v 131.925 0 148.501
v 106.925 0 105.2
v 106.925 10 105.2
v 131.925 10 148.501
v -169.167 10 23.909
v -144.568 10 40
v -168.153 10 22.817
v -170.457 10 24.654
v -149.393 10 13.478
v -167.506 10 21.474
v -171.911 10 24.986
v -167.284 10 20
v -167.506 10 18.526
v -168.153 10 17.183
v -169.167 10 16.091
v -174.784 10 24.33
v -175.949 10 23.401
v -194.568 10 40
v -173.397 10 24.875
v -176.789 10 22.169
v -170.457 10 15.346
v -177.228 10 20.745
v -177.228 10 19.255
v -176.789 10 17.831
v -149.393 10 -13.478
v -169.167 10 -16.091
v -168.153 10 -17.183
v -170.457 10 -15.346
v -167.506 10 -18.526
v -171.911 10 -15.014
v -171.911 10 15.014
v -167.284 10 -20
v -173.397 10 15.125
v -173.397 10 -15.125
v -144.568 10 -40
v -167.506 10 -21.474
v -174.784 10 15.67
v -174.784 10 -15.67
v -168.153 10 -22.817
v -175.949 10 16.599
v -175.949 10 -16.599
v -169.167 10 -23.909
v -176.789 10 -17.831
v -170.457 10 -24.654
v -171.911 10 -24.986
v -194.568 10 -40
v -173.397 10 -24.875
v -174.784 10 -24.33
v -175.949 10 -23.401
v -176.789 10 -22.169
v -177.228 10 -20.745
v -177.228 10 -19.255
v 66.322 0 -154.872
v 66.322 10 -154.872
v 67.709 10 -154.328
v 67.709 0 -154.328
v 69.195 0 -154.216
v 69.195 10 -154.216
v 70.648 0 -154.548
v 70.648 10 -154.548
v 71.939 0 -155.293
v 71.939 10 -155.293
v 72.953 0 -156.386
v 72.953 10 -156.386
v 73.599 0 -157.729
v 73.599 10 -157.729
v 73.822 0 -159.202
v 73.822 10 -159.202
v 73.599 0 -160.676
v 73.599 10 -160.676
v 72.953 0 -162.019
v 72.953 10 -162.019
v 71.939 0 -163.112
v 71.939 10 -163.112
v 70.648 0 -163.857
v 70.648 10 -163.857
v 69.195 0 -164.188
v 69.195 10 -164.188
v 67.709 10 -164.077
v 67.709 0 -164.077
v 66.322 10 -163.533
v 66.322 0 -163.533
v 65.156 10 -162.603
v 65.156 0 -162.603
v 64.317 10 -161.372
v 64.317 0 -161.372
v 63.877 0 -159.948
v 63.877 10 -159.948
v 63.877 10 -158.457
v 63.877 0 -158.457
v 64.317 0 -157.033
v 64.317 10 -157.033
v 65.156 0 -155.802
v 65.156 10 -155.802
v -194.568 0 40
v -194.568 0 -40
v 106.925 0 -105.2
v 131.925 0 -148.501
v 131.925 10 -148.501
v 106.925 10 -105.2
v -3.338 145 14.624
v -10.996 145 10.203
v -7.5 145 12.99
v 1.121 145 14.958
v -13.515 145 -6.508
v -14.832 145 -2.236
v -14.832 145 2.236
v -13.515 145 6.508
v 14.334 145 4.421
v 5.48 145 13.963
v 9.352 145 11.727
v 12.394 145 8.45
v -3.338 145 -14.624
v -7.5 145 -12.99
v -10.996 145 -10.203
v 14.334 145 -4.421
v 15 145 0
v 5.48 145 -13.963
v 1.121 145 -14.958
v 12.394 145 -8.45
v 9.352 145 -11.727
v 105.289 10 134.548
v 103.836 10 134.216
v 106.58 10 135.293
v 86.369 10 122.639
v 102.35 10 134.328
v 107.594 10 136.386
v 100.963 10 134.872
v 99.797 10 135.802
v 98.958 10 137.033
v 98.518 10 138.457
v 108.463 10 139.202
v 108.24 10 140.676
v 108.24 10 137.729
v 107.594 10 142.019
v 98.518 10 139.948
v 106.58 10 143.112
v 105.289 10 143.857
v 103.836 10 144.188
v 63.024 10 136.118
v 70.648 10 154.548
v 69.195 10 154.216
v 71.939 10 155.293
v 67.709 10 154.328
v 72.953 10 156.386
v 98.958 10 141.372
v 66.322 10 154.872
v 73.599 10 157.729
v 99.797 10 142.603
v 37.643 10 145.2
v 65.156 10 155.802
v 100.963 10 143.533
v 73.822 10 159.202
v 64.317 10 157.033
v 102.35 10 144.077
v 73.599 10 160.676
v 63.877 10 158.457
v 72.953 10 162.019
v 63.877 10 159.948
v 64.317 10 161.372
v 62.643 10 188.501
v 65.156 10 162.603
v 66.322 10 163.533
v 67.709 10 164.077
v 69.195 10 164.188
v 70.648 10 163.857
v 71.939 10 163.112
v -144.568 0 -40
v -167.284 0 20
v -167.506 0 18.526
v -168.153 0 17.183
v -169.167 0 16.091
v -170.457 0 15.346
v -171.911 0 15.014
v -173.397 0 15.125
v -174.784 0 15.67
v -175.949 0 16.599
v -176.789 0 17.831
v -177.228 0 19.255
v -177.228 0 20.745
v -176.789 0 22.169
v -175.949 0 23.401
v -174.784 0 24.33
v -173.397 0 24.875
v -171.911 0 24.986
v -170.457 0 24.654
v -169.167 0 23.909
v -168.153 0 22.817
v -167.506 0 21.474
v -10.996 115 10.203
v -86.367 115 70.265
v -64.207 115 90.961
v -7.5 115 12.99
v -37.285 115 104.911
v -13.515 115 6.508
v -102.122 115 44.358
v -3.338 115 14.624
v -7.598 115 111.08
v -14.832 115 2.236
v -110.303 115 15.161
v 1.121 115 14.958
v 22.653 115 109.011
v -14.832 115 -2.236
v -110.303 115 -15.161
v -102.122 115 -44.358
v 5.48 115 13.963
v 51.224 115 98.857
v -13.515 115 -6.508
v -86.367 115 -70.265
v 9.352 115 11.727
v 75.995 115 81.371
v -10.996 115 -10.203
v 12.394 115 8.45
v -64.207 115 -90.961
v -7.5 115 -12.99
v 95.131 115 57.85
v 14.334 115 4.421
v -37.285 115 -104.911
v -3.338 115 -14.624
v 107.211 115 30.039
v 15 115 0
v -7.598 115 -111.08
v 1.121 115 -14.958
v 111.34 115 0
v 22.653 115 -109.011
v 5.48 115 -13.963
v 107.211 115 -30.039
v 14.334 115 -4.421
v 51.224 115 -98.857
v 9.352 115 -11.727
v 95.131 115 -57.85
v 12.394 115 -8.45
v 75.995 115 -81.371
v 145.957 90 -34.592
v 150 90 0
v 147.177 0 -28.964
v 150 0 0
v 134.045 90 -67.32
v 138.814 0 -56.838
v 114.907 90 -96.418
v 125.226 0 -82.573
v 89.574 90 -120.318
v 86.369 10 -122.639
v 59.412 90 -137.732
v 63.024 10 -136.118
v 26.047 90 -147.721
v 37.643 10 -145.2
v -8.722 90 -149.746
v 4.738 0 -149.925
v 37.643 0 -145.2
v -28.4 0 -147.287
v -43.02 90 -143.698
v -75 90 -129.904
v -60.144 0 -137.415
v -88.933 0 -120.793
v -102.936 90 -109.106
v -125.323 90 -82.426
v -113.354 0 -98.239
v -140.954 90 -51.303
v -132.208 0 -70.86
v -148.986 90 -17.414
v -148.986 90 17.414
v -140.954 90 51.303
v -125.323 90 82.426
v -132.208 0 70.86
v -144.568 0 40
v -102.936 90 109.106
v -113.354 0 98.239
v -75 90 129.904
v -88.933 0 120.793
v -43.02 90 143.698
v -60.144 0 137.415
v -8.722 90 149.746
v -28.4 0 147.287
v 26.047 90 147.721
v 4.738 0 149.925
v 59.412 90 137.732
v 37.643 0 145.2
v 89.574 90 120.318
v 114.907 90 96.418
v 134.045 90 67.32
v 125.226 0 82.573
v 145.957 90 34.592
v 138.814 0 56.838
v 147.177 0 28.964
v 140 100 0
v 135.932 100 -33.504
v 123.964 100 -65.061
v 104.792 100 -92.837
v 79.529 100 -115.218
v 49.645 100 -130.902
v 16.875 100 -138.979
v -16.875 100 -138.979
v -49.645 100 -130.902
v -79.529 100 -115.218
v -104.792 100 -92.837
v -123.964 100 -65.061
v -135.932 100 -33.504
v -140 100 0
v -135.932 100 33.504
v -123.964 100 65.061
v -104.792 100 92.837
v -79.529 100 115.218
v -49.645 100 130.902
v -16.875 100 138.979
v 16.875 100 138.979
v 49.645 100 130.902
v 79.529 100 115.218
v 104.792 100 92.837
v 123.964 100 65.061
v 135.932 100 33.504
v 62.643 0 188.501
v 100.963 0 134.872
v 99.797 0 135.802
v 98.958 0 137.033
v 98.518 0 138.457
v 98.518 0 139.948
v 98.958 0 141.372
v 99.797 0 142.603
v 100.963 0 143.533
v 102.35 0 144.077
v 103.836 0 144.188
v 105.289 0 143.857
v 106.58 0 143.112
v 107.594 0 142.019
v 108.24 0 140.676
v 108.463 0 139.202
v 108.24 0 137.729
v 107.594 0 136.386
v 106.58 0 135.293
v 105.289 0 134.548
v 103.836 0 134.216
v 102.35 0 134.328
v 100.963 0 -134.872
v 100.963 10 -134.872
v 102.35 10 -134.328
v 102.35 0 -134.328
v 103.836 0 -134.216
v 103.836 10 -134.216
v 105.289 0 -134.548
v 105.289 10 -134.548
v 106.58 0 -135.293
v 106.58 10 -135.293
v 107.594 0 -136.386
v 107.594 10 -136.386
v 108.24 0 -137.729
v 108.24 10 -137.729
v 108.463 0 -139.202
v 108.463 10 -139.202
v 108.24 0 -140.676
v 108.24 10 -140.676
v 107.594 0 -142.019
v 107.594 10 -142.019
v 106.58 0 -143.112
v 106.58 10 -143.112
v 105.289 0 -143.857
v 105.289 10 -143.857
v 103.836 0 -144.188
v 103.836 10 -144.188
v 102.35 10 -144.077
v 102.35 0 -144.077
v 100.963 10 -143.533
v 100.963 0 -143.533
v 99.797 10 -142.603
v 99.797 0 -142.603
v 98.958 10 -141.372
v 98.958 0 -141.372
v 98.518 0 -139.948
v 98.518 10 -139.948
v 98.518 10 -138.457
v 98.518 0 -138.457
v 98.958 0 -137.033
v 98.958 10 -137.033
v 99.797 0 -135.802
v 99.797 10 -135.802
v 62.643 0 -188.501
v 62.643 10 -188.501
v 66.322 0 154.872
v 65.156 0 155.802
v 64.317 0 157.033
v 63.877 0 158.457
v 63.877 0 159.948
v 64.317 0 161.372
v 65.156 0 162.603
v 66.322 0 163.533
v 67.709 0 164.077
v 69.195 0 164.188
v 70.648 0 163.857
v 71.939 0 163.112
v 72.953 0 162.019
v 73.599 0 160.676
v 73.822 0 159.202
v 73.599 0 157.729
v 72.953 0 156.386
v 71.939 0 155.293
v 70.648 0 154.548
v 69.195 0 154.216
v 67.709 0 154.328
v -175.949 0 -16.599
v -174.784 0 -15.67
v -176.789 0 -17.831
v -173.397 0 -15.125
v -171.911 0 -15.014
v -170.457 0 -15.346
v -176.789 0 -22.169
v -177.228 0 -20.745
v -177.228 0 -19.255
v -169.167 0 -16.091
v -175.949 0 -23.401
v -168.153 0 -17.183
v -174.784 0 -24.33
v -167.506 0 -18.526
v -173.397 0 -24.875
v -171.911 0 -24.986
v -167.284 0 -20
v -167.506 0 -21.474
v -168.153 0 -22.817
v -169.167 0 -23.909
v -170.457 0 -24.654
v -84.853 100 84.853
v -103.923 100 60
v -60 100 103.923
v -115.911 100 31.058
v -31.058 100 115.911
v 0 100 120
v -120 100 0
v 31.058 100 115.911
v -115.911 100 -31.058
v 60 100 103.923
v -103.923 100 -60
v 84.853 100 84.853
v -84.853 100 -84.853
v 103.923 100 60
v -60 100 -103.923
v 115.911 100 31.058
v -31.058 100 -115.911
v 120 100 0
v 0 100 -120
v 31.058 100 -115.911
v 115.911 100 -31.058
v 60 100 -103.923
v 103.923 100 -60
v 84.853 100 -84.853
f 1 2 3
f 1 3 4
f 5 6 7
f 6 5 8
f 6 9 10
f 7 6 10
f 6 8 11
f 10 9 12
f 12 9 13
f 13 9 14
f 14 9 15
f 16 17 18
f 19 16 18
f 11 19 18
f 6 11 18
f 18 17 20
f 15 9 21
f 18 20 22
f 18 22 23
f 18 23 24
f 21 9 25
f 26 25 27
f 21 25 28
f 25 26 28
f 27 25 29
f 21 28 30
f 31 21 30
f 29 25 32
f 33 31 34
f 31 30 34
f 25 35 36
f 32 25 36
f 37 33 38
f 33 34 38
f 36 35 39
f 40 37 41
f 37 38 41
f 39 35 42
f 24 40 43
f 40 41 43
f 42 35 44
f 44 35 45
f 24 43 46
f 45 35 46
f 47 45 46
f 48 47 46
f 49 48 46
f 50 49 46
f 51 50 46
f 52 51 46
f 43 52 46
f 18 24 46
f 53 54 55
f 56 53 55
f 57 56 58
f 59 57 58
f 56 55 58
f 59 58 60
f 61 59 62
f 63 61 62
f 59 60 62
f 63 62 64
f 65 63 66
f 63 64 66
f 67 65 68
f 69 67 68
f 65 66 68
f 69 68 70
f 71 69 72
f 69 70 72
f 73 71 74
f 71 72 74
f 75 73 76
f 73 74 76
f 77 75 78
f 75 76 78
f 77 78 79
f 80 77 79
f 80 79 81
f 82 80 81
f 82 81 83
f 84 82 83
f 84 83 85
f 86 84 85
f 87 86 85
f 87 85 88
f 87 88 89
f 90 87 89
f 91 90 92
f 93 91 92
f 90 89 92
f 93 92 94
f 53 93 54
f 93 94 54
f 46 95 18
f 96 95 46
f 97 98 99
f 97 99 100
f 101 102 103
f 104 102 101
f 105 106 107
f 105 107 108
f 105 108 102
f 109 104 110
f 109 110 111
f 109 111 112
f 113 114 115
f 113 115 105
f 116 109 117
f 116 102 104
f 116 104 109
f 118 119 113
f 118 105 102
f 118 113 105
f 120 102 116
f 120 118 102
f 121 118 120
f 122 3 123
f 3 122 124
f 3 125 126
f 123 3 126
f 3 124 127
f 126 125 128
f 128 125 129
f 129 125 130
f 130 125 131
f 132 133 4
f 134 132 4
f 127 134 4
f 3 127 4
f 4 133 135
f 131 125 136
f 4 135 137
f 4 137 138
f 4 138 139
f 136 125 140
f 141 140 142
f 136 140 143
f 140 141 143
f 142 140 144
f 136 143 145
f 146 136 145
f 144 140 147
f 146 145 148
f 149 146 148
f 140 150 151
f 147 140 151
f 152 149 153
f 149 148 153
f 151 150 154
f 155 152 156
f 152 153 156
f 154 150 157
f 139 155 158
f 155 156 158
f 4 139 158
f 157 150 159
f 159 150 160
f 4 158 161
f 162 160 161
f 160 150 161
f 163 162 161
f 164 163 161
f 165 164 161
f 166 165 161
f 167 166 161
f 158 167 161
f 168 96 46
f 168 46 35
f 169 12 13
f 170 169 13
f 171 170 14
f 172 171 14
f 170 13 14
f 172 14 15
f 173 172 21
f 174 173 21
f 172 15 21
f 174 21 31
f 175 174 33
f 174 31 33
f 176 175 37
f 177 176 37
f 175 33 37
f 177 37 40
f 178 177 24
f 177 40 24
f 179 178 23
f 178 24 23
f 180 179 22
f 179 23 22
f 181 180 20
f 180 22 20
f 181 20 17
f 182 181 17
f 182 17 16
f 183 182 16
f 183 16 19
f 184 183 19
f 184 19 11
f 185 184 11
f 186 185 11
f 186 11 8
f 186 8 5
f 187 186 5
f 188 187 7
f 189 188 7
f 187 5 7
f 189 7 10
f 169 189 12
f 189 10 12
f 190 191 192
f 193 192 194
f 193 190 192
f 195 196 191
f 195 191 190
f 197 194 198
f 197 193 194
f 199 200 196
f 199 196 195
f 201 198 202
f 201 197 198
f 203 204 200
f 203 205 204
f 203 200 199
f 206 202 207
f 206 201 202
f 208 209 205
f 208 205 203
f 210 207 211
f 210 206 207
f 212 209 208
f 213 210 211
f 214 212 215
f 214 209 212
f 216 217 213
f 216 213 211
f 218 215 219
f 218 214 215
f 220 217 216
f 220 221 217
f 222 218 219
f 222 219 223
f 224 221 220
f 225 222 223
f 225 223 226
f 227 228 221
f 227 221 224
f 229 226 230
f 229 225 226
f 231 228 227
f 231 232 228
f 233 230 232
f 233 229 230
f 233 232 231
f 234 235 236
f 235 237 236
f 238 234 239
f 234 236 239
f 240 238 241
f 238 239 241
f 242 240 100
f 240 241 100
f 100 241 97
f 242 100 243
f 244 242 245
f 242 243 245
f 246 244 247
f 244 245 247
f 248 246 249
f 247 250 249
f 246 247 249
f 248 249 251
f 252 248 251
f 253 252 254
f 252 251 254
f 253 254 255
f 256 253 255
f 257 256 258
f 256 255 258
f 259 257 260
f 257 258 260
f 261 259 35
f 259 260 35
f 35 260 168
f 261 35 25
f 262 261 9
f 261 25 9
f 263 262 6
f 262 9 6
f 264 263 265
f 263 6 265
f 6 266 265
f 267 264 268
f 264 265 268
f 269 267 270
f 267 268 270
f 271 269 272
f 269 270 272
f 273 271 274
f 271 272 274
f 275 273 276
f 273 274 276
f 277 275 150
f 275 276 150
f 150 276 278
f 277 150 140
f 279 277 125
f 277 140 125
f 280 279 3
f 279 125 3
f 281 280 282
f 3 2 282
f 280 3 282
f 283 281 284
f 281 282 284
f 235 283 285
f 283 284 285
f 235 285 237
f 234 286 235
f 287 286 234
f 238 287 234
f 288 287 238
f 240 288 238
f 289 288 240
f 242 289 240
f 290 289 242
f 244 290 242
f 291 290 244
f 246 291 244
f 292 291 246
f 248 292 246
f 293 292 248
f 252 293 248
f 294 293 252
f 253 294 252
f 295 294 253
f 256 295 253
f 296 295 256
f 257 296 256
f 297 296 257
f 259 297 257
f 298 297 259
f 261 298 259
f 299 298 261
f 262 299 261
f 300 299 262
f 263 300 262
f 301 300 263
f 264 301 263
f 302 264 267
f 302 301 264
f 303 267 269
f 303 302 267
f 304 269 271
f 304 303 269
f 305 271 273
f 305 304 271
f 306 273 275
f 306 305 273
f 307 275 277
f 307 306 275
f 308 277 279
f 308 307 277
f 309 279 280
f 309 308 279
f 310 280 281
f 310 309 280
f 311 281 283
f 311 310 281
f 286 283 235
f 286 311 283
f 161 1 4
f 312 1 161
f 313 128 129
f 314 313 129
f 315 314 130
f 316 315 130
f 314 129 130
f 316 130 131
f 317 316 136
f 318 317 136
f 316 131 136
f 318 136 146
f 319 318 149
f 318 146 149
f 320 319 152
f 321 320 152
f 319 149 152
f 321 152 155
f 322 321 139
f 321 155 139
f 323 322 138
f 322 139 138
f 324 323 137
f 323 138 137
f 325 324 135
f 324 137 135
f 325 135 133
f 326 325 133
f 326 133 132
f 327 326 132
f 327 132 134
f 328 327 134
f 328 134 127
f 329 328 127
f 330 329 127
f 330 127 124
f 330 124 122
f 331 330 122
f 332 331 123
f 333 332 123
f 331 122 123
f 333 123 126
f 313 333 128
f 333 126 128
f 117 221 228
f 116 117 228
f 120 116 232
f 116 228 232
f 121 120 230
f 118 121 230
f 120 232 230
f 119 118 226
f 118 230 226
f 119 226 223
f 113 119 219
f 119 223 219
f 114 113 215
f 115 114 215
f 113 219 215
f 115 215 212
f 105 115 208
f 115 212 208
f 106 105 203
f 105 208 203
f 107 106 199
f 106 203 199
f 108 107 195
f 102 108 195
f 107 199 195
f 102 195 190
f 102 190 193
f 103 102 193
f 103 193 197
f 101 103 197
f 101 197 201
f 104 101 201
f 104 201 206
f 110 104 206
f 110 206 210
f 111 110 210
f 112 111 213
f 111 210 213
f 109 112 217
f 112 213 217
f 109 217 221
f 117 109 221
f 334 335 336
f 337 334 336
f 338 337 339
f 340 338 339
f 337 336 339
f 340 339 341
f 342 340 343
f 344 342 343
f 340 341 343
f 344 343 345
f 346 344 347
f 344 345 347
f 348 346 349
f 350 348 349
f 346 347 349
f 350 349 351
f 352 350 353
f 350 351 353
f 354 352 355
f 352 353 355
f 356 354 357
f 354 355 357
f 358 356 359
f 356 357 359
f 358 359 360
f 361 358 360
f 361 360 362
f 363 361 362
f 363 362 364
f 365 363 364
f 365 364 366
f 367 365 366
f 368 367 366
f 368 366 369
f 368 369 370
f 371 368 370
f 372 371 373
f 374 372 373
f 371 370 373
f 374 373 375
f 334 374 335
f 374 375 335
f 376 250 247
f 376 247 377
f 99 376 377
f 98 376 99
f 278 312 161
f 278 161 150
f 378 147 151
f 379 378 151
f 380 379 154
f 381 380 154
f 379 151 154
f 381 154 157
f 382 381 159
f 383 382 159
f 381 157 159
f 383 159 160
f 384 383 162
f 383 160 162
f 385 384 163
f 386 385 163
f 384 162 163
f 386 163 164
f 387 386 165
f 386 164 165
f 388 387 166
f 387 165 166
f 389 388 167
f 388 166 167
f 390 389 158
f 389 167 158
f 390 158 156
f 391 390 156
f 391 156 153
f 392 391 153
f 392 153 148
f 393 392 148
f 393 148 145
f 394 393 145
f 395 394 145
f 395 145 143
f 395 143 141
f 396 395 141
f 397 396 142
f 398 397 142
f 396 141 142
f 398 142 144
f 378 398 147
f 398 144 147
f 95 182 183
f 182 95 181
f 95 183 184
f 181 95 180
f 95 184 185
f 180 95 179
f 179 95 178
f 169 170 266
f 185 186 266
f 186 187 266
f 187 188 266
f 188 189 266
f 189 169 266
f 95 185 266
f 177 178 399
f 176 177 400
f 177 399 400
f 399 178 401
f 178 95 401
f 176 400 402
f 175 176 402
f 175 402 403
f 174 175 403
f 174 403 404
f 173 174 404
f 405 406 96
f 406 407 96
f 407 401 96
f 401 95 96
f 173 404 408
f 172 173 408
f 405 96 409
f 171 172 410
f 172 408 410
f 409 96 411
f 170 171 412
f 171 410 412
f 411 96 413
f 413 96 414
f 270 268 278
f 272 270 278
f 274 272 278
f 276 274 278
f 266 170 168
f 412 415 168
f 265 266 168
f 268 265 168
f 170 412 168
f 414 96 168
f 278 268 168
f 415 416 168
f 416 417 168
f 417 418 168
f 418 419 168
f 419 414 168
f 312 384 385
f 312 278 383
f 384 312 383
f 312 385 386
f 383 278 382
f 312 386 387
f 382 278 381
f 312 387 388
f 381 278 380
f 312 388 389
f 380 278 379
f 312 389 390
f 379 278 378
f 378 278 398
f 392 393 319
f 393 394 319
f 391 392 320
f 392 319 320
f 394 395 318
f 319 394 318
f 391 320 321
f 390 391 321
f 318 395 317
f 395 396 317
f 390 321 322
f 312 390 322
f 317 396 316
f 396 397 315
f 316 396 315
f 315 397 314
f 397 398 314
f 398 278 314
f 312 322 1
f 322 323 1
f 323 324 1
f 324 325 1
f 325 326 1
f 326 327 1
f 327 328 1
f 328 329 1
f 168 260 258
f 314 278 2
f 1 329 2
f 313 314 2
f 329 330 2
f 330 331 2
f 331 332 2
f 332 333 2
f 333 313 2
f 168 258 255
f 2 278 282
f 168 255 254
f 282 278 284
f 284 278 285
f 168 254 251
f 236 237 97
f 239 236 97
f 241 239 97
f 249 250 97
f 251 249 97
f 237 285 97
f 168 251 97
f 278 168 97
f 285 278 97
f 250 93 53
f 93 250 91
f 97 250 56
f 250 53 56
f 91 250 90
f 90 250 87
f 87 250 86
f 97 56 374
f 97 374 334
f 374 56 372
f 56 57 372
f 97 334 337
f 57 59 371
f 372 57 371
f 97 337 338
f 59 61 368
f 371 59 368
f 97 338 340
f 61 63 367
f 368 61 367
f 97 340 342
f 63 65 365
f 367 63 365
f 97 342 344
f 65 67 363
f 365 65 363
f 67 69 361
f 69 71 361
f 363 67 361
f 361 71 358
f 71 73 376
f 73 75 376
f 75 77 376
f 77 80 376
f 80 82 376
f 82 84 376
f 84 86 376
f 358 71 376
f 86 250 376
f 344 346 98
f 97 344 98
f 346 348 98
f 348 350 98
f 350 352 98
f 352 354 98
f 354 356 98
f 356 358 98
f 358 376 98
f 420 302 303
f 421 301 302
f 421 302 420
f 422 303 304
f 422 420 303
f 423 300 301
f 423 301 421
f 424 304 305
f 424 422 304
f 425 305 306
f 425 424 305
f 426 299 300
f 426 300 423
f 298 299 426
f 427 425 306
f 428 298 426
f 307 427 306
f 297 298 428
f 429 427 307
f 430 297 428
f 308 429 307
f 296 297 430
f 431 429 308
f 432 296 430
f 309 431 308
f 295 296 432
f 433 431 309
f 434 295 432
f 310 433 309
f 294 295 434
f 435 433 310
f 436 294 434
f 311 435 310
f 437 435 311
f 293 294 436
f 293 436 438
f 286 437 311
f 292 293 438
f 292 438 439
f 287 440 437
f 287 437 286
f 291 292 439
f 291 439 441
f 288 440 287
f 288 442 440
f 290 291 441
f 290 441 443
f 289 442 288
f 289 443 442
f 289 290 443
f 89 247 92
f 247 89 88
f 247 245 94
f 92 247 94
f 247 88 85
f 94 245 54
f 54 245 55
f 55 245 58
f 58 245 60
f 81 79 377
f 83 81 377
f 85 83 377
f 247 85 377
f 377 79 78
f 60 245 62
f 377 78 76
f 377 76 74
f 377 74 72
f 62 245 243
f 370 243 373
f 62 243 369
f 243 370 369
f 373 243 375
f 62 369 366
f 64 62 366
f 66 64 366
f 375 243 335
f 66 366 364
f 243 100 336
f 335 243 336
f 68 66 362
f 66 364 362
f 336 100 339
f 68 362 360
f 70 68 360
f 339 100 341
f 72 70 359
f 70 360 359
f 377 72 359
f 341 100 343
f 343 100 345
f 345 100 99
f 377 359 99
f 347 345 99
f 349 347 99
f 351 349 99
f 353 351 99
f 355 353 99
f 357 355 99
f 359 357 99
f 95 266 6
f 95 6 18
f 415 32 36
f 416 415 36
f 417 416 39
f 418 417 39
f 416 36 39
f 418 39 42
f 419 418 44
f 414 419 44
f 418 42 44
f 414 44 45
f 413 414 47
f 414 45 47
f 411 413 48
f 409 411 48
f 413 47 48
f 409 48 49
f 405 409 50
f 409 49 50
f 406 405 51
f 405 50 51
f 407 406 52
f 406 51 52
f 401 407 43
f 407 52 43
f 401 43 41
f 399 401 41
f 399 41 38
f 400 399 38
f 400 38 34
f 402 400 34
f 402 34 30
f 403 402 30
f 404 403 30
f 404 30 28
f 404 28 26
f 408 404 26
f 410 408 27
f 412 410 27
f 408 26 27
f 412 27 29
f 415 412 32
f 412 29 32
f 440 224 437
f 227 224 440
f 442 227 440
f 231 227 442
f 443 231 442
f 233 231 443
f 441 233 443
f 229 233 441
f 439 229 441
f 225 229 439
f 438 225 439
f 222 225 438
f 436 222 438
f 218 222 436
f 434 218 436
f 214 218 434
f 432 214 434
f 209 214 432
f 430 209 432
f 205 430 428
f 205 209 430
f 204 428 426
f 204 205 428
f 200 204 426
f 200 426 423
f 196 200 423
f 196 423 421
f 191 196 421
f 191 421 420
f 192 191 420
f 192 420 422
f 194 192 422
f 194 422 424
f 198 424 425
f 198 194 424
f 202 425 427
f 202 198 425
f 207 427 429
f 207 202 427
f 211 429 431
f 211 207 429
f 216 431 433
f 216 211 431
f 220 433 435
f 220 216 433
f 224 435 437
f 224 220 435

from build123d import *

# Parameters (mm, degrees)
SKETCH1_R           = 150
BOSS_EXTRUDE1_DEPTH = 100
CHAMFER1_SIZE       = 10
BOSS_EXTRUDE2_START = -100
BOSS_EXTRUDE2_DEPTH = 10
SKETCH3_R           = 5
CUT_EXTRUDE1_DEPTH  = 10
CIRPATTERN2_COUNT   = 3
SKETCH4_R           = 120
BOSS_EXTRUDE4_DEPTH = 15
BOSS_EXTRUDE4_TAPER = 30
SKETCH5_R           = 15
BOSS_EXTRUDE5_DEPTH = 30


with BuildPart() as part:
    # Sketch1 → Boss-Extrude1 (new body)
    with BuildSketch(Plane(origin=(0, 0, 0), x_dir=(1, 0, 0), z_dir=(0, 1, 0))):
        Circle(SKETCH1_R)
    extrude(amount=BOSS_EXTRUDE1_DEPTH)

    # Chamfer1
    chamfer1_edges = [part.edges().sort_by_distance(p)[0] for p in [
        (-150, 100, 0),
    ]]
    chamfer(chamfer1_edges, length=CHAMFER1_SIZE)

    # Sketch2 → Boss-Extrude2 (add)
    with BuildSketch(Plane(origin=(0, 100, 0), x_dir=(1, 0, 0), z_dir=(0, 1, 0)).offset(BOSS_EXTRUDE2_START)):
        with BuildLine():
            Line((-194.568322948, -40), (-194.568322948, 40))
            Line((-194.568322948, 40), (-144.568322948, 40))
            ThreePointArc((-144.568322948, 40), (-150, 0), (-144.568322948, -40))
            Line((-144.568322948, -40), (-194.568322948, -40))
        make_face()
    boss_extrude2 = extrude(amount=BOSS_EXTRUDE2_DEPTH)

    # Sketch3 → Cut-Extrude1 (cut)
    with BuildSketch(Plane(origin=(0, 10, 0), x_dir=(1, 0, 0), z_dir=(0, 1, 0))):
        with Locations((-172.284161474, -20)):
            Circle(SKETCH3_R)
        with Locations((-172.284161474, 20)):
            Circle(SKETCH3_R)
    cut_extrude1 = extrude(amount=-CUT_EXTRUDE1_DEPTH, mode=Mode.SUBTRACT)

    # CirPattern2: Boss-Extrude2, Cut-Extrude1 ×3 about axis
    cirpattern2_axis = Axis((0, 0, 0), (0, 1, 0))
    for i in range(1, CIRPATTERN2_COUNT):
        add(boss_extrude2.rotate(cirpattern2_axis, i * 360 / CIRPATTERN2_COUNT))
        add(cut_extrude1.rotate(cirpattern2_axis, i * 360 / CIRPATTERN2_COUNT), mode=Mode.SUBTRACT)

    # Sketch4 → Boss-Extrude4 (add)
    with BuildSketch(Plane(origin=(0, 100, 0), x_dir=(1, 0, 0), z_dir=(0, 1, 0))):
        Circle(SKETCH4_R)
    extrude(amount=BOSS_EXTRUDE4_DEPTH, taper=BOSS_EXTRUDE4_TAPER)

    # Sketch5 → Boss-Extrude5 (add)
    with BuildSketch(Plane(origin=(0, 115, 0), x_dir=(1, 0, 0), z_dir=(0, 1, 0))):
        Circle(SKETCH5_R)
    extrude(amount=BOSS_EXTRUDE5_DEPTH)


solid = part.part
